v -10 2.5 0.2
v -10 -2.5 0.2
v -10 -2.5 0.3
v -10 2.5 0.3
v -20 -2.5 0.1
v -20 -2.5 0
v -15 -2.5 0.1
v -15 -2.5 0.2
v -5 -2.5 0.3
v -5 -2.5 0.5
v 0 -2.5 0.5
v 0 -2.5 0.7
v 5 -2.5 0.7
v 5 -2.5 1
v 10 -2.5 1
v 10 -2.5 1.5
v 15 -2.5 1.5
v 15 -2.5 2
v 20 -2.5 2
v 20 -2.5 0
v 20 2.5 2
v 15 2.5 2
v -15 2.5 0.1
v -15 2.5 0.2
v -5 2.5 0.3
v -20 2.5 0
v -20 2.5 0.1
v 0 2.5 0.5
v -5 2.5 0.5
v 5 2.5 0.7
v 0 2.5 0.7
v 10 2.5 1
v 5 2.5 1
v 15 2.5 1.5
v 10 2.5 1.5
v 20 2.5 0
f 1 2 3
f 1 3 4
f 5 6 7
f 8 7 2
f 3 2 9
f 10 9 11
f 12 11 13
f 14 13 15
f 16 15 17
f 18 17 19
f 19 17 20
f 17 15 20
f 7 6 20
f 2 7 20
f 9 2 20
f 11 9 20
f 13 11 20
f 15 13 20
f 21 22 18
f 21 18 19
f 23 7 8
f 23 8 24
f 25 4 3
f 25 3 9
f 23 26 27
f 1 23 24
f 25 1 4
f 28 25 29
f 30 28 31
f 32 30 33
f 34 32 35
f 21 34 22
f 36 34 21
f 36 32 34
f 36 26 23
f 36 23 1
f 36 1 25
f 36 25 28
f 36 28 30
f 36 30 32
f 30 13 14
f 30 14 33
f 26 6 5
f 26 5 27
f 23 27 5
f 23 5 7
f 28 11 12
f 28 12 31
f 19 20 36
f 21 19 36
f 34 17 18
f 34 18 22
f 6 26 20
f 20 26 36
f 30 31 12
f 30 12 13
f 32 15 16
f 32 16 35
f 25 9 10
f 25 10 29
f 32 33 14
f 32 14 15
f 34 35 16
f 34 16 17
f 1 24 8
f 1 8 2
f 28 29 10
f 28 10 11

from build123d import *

# Parameters (mm, degrees)
F0_W     = 5
F0_H     = 5
F1_DEPTH = 0.1
F2_DEPTH = 0.5
F3_DEPTH = 0.7
F4_DEPTH = 1
F5_DEPTH = 1.5
F6_DEPTH = 2
F7_DEPTH = 0.2
F8_DEPTH = 0.3


with BuildPart() as f1:
    # F0 (on Top) → F1 (new body)
    with BuildSketch(Plane.XY):
        with Locations((-17.5, 0)):
            Rectangle(F0_W, F0_H)
    extrude(amount=F1_DEPTH)

    # F0 (on Top) → F7 (join)
    with BuildSketch(Plane.XY):
        with Locations((-12.5, 0)):
            Rectangle(F0_W, F0_H)
    extrude(amount=F7_DEPTH)



with BuildPart() as f2:
    # F0 (on Top) → F2 (new body)
    with BuildSketch(Plane.XY):
        with Locations((-2.5, 0)):
            Rectangle(F0_W, F0_H)
    extrude(amount=F2_DEPTH)

    # F0 (on Top) → F3 (join)
    with BuildSketch(Plane.XY):
        with Locations((2.5, 0)):
            Rectangle(F0_W, F0_H)
    extrude(amount=F3_DEPTH)

    # F0 (on Top) → F4 (join)
    with BuildSketch(Plane.XY):
        with Locations((7.5, 0)):
            Rectangle(F0_W, F0_H)
    extrude(amount=F4_DEPTH)

    # F0 (on Top) → F5 (join)
    with BuildSketch(Plane.XY):
        with Locations((12.5, 0)):
            Rectangle(F0_W, F0_H)
    extrude(amount=F5_DEPTH)

    # F0 (on Top) → F6 (join)
    with BuildSketch(Plane.XY):
        with Locations((17.5, 0)):
            Rectangle(F0_W, F0_H)
    extrude(amount=F6_DEPTH)


with BuildPart() as f1_1:
    add(f1.part)

    add(f2.part)  # F8 merges F2
    # F0 (on Top) → F8 (join)
    with BuildSketch(Plane.XY):
        with Locations((-7.5, 0)):
            Rectangle(F0_W, F0_H)
    extrude(amount=F8_DEPTH)


solid = f1_1.part
